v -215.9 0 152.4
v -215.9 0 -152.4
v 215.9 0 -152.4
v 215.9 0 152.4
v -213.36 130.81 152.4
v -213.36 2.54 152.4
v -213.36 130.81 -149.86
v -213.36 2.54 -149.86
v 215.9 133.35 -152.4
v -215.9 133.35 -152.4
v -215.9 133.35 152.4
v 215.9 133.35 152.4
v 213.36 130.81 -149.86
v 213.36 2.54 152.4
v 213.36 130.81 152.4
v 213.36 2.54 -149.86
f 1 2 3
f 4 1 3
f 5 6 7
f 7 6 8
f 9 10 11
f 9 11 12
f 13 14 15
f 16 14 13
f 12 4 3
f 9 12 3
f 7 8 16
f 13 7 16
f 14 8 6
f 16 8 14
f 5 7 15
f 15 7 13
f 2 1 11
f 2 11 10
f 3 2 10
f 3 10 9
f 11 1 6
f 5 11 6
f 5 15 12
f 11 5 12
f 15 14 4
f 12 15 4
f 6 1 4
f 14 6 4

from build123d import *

# Parameters (mm, degrees)
SKETCH1_W           = 431.8
SKETCH1_H           = 304.8
BOSS_EXTRUDE1_DEPTH = 133.35
CUT_EXTRUDE1_START  = 2.54
SKETCH2_W           = 426.72
SKETCH2_H           = 302.26
CUT_EXTRUDE1_DEPTH  = 128.27


with BuildPart() as part:
    # Sketch1 → Boss-Extrude1 (new body)
    with BuildSketch(Plane(origin=(0, 0, 0), x_dir=(1, 0, 0), z_dir=(0, 1, 0))):
        Rectangle(SKETCH1_W, SKETCH1_H)
    extrude(amount=BOSS_EXTRUDE1_DEPTH)

    # Sketch2 → Cut-Extrude1 (cut)
    with BuildSketch(Plane(origin=(0, 0, 0), x_dir=(1, 0, 0), z_dir=(0, 1, 0)).offset(CUT_EXTRUDE1_START)):
        with Locations((0, -1.27)):
            Rectangle(SKETCH2_W, SKETCH2_H)
    extrude(amount=CUT_EXTRUDE1_DEPTH, mode=Mode.SUBTRACT)


solid = part.part
